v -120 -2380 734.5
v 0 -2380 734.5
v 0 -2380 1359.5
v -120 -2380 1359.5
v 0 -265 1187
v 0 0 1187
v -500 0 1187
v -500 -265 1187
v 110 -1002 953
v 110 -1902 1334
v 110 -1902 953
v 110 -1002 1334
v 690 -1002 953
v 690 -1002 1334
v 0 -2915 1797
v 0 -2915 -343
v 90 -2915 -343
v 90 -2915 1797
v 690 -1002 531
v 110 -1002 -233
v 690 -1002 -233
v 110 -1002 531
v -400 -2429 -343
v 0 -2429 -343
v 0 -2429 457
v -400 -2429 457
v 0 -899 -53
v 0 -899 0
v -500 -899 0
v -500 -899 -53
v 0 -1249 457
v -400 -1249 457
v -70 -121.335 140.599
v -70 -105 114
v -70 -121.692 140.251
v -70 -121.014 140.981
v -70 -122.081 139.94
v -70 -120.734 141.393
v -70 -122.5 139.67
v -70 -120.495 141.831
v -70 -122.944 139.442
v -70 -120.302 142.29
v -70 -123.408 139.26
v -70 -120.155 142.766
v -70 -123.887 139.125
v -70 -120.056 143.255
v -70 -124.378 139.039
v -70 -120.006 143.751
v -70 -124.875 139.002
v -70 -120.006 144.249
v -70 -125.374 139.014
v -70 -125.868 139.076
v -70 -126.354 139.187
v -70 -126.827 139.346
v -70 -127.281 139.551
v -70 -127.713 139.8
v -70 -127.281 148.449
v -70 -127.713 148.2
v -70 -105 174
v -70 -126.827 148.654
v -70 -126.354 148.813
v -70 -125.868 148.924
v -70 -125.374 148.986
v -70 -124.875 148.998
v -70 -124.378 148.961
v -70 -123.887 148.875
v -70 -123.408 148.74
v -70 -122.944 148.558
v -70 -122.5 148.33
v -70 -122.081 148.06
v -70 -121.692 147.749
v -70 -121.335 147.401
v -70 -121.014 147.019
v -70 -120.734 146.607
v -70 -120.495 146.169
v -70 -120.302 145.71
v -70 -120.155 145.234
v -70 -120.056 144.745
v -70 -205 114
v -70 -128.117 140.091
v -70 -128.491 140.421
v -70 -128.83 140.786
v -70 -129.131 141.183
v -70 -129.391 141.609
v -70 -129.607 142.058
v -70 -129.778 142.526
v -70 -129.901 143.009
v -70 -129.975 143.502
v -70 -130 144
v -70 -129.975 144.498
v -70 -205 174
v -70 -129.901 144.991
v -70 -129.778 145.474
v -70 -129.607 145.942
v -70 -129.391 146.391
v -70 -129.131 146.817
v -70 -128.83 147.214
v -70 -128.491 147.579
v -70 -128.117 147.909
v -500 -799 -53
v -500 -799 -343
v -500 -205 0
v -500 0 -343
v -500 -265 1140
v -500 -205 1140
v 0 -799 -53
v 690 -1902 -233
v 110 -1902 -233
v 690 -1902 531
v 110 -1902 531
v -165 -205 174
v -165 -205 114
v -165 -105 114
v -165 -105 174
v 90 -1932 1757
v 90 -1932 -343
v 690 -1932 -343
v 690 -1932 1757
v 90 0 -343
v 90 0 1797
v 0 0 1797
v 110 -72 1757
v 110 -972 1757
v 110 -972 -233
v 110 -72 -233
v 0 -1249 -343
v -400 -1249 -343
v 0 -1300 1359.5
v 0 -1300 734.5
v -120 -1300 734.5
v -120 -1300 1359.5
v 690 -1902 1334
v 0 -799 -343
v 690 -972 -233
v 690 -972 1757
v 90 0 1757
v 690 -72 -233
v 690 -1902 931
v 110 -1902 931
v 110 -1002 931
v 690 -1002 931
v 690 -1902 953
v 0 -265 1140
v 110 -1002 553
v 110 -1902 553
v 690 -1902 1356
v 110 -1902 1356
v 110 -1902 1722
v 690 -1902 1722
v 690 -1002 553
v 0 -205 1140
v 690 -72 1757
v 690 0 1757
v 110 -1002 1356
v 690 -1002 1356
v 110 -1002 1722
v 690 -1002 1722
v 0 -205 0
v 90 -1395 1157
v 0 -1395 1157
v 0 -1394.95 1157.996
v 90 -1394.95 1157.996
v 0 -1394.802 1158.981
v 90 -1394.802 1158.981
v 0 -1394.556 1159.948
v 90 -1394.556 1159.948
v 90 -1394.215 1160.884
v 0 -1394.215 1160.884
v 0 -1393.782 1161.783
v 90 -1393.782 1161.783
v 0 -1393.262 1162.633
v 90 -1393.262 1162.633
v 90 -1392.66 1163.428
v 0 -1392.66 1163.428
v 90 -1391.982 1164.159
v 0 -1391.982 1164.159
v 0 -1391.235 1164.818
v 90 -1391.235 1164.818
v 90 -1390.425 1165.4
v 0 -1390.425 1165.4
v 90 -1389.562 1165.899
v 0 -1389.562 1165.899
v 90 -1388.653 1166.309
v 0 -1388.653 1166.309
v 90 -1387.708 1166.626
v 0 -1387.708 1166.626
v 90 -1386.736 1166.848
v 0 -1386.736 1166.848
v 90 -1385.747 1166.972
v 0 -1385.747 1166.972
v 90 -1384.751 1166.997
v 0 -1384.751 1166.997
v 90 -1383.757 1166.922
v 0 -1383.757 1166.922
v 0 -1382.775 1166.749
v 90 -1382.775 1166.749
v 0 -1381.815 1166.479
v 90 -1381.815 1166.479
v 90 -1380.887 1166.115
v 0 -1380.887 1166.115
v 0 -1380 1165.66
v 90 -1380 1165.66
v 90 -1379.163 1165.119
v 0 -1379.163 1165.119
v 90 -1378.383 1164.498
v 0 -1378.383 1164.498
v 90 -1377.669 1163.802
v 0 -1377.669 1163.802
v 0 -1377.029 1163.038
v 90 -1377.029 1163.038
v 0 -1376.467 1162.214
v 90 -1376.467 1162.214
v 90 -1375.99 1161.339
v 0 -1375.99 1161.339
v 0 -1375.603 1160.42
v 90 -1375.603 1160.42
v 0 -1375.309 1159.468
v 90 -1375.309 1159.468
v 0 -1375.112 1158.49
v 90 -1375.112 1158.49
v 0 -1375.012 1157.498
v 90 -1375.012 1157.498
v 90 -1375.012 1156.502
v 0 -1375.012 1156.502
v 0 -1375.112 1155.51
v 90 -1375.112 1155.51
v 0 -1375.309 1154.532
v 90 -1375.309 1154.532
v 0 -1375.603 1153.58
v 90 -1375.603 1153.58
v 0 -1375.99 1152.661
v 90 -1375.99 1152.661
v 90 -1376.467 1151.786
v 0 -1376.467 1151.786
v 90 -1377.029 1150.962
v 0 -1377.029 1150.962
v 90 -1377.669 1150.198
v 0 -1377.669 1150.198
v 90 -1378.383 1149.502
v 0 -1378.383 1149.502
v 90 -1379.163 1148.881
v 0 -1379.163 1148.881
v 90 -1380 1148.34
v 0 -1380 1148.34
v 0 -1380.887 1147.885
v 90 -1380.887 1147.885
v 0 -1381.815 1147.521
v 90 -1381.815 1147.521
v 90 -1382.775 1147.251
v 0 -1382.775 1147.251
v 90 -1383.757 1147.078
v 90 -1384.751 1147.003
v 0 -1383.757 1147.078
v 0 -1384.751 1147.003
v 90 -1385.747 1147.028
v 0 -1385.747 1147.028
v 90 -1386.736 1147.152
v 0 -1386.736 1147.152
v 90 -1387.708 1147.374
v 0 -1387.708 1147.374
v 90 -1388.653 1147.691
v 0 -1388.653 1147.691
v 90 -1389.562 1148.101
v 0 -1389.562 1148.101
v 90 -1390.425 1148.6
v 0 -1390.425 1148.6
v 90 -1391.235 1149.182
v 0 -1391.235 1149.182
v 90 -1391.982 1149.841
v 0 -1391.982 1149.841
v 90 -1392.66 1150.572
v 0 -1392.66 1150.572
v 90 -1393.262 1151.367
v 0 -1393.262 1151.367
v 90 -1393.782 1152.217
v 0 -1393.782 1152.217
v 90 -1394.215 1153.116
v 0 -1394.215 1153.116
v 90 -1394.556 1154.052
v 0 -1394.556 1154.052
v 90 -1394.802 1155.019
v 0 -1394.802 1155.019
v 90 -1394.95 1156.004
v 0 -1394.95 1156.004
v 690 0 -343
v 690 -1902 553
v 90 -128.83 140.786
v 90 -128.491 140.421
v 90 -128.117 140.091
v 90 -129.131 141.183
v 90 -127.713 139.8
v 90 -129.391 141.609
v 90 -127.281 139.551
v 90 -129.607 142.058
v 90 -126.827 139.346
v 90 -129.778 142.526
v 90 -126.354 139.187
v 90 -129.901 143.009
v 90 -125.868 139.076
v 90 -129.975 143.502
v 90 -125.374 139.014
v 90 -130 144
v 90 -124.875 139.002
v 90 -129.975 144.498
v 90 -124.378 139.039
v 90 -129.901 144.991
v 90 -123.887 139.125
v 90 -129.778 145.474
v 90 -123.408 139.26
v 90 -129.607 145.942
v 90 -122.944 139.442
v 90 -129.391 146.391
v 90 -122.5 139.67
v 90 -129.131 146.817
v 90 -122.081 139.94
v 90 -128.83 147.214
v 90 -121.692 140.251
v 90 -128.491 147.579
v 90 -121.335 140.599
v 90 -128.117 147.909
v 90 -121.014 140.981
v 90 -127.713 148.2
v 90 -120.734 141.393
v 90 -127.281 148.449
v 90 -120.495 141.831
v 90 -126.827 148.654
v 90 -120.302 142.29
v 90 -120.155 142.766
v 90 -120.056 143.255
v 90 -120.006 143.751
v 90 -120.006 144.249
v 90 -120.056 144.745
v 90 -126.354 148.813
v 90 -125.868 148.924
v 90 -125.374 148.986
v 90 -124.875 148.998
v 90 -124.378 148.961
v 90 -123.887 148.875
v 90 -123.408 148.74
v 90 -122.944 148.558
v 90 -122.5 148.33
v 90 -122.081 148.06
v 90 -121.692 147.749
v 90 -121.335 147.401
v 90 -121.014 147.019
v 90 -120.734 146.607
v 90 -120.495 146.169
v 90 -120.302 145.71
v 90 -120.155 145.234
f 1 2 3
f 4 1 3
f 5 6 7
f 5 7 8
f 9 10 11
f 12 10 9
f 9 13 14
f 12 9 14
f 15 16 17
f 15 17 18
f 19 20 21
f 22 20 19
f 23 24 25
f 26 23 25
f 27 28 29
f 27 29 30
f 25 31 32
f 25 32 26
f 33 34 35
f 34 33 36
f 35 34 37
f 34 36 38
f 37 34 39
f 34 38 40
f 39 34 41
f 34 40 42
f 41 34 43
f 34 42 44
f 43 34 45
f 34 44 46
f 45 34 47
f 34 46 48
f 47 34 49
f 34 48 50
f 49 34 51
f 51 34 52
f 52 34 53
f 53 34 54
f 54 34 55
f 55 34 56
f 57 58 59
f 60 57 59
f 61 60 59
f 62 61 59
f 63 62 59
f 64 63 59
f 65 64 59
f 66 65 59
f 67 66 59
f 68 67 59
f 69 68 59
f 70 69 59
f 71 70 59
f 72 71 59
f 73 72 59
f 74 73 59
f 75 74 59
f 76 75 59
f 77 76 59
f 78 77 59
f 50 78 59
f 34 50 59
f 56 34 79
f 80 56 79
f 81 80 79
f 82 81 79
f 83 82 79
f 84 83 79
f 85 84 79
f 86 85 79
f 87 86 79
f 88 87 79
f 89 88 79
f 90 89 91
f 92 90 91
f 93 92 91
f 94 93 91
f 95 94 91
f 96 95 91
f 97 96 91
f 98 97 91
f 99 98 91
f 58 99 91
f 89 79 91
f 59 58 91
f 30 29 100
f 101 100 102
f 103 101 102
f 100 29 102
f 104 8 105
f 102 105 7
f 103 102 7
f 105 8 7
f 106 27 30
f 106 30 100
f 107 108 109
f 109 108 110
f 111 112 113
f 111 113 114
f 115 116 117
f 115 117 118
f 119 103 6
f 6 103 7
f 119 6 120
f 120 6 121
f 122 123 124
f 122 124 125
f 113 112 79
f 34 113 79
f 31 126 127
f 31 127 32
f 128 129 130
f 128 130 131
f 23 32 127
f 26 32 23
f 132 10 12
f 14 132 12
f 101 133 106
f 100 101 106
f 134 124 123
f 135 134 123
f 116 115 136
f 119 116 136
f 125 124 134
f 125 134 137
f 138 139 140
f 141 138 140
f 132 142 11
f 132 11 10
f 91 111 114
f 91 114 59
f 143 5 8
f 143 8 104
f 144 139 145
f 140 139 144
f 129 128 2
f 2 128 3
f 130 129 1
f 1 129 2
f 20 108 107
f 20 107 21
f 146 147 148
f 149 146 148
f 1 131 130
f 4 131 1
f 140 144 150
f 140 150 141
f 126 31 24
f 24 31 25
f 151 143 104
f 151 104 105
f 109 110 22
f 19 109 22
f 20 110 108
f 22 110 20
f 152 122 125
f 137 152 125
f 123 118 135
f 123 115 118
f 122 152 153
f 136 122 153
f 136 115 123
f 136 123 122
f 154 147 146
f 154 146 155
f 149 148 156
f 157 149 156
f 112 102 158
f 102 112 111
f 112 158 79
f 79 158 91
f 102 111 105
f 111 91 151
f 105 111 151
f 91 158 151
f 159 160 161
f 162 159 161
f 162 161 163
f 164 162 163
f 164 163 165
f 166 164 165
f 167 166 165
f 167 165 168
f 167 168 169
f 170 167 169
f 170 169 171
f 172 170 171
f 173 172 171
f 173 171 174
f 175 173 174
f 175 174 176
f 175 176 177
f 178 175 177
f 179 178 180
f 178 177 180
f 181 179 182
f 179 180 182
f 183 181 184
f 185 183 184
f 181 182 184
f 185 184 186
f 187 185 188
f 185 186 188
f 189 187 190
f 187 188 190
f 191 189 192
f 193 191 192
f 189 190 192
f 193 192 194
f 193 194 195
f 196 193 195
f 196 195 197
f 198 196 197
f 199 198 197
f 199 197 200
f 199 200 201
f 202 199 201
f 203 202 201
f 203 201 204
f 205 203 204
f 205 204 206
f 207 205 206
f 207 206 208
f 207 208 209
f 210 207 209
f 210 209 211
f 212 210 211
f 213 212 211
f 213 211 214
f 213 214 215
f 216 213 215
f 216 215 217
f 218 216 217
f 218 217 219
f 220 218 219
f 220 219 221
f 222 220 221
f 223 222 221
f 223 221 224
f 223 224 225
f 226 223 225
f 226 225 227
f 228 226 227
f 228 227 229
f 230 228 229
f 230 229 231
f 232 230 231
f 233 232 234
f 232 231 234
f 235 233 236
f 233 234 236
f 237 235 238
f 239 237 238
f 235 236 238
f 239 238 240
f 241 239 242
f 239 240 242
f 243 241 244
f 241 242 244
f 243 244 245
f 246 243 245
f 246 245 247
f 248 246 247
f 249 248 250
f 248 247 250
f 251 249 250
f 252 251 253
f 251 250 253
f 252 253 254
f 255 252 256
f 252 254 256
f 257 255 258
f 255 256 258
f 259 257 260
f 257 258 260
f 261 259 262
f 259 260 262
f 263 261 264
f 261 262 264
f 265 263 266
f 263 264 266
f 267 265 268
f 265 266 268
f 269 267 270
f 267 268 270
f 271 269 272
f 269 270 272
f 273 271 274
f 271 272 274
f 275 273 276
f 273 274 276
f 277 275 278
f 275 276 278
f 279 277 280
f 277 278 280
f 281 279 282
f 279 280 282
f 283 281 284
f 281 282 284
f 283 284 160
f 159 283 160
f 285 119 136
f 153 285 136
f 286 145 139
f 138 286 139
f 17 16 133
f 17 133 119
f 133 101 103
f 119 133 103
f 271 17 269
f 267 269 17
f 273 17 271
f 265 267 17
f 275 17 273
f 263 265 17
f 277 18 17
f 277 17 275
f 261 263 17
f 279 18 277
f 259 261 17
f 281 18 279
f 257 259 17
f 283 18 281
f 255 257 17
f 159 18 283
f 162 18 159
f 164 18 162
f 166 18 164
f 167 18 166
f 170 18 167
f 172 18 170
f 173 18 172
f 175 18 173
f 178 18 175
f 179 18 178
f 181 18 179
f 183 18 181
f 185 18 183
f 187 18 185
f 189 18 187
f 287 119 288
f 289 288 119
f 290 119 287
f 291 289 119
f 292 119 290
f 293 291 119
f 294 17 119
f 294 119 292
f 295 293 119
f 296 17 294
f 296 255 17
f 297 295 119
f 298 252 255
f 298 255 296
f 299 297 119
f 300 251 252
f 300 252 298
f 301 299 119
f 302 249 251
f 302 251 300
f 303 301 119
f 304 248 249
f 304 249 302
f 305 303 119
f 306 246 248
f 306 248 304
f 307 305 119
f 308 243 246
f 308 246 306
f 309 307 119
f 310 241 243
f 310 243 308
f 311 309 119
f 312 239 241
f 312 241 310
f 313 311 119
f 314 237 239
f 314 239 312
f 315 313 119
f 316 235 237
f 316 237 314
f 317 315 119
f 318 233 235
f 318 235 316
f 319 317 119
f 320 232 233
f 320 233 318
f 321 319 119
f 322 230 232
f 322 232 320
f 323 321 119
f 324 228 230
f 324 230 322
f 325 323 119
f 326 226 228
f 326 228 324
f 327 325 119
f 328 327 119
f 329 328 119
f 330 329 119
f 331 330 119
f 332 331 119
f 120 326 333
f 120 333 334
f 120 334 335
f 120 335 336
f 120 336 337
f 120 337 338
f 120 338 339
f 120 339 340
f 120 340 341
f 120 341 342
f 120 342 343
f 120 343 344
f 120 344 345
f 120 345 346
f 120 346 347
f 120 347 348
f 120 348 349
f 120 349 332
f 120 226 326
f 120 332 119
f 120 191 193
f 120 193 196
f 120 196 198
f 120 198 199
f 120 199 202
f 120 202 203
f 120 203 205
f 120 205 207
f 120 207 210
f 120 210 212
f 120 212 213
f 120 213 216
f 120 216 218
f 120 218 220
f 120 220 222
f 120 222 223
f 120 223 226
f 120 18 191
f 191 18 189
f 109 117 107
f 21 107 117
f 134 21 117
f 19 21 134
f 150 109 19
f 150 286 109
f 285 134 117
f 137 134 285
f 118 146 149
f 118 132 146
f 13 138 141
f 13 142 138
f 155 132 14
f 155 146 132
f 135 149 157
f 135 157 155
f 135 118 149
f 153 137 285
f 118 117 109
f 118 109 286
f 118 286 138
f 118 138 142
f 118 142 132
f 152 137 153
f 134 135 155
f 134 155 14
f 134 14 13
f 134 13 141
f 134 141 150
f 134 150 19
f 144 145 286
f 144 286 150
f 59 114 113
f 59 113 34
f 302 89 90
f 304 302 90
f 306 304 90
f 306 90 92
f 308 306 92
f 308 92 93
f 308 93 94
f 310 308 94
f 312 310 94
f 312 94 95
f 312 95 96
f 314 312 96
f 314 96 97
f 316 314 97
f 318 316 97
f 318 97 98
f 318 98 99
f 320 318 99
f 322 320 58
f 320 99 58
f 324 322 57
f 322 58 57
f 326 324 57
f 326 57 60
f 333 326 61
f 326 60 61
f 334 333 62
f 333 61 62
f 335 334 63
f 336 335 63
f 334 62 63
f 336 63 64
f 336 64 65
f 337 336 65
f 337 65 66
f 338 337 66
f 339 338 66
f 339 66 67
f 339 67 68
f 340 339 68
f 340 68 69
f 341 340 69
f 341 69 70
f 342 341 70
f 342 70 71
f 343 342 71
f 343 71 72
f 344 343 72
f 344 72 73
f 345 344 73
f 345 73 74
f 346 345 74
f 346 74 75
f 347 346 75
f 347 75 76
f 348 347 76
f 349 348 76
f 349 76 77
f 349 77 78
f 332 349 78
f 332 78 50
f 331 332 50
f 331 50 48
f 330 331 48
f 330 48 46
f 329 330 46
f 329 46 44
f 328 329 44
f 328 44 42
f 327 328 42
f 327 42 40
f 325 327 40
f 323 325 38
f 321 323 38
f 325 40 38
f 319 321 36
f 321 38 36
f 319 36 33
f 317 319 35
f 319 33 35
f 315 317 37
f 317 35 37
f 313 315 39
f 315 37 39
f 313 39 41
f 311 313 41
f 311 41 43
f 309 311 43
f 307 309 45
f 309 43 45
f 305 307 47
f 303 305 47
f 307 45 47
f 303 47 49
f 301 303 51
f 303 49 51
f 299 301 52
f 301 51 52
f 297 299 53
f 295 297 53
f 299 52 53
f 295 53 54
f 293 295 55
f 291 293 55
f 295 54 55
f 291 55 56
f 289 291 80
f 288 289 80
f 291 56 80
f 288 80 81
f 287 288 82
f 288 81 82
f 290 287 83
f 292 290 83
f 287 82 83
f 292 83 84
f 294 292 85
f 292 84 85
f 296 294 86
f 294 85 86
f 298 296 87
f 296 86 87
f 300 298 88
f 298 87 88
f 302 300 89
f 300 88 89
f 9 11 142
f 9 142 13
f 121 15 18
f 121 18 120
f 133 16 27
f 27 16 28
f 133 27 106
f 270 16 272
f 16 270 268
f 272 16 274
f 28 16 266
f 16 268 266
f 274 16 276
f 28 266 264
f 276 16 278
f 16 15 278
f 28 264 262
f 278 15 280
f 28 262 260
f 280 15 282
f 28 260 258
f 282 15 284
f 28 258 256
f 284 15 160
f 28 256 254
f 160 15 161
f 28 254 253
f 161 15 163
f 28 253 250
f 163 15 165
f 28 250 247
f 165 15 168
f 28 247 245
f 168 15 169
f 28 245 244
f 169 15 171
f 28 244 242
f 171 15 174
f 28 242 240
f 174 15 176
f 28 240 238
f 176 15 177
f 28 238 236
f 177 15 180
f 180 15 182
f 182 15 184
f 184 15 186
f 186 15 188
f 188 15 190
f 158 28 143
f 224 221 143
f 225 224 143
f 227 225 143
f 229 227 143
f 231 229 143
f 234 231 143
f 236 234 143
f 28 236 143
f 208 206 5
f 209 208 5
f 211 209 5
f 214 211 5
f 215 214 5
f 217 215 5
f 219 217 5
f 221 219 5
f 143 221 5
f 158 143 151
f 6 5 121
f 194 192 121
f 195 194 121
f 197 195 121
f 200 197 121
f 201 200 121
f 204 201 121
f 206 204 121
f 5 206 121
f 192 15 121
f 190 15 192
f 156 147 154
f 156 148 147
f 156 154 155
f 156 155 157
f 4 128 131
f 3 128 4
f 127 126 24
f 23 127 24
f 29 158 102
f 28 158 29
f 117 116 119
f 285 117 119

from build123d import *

# Parameters (mm, degrees)
F0_W      = 205
F0_H      = 1140
F0_W_2    = 799
F0_H_2    = 290
F1_DEPTH  = 500
F2_W      = 95
F2_H      = 60
F3_DEPTH  = 100
F4_W      = 2915
F4_H      = 2140
F5_DEPTH  = 90
F6_W      = 1860
F6_H      = 110
F7_DEPTH  = 600
F6_H_2    = 1990
F8_DEPTH  = 20
F9_R      = 5
F10_DEPTH = 760.001
F11_W     = 30
F11_H     = 1990
F12_DEPTH = 580
F13_W     = 1080
F13_H     = 625
F14_DEPTH = 120
F13_W_2   = 1180
F13_H_2   = 800
F15_DEPTH = 400
F16_R     = 10
F17_DEPTH = 110
F18_W     = 900
F18_H     = 35
F18_H_2   = 22
F19_DEPTH = 580


# Not quite as in the source:
# - a feature names something its author has since deleted; it is built from what else it names


with BuildPart() as f1:
    # F0 (on Right) → F1 (new body)
    with BuildSketch(Plane.YZ):
        Polygon((0, -53), (0, 0), (-205, 0), (-899, 0), (-899, -53), (-799, -53), align=None)
        with Locations((-102.5, 570)):
            Rectangle(F0_W, F0_H)
        Polygon((-205, 1140), (0, 1140), (0, 1187), (-265, 1187), (-265, 1140), align=None)
        with Locations((-399.5, -198)):
            Rectangle(F0_W_2, F0_H_2)
    extrude(amount=-F1_DEPTH)

    # F2 (on face) → F3 (cut)
    with BuildSketch(Plane.XZ.offset(205)):
        with Locations((-117.5, 144)):
            Rectangle(F2_W, F2_H)
    extrude(amount=-F3_DEPTH, mode=Mode.SUBTRACT)

    # F4 (on Right) → F5 (join)
    with BuildSketch(Plane.YZ):
        with Locations((-1457.5, 727)):
            Rectangle(F4_W, F4_H)
    extrude(amount=F5_DEPTH)

    # F9 (on face) → F10 (cut, through all)
    with BuildSketch(Plane(origin=(-70, 0, 0), x_dir=(0, -1, 0), z_dir=(-1, 0, 0))):
        with Locations((125, 144)):
            Circle(F9_R)
    extrude(amount=-F10_DEPTH, mode=Mode.SUBTRACT)

    # F16 (on face) → F17 (cut, through all)
    with BuildSketch(Plane(origin=(0, 0, 0), x_dir=(0, -1, 0), z_dir=(-1, 0, 0))):
        with Locations((1385, 1157)):
            Circle(F16_R)
    extrude(amount=-F17_DEPTH, mode=Mode.SUBTRACT)


with BuildPart() as f7:
    # F6 (on face) → F7 (new body)
    with BuildSketch(Plane.YZ.offset(90)):
        Polygon((-72, -343), (0, -343), (0, 1757), (-72, 1757), (-72, -233), align=None)
        with Locations((-1002, -288)):
            Rectangle(F6_W, F6_H)
    extrude(amount=F7_DEPTH)

    # F6 (on face) → F8 (join)
    with BuildSketch(Plane.YZ.offset(90)):
        Polygon((-72, -343), (0, -343), (0, 1757), (-72, 1757), (-72, -233), align=None)
        with Locations((-1002, -288)):
            Rectangle(F6_W, F6_H)
        with Locations((-1002, 762)):
            Rectangle(F6_W, F6_H_2)
    extrude(amount=F8_DEPTH)

    # F11 (on face) → F12 (join, through all)
    with BuildSketch(Plane.YZ.offset(110)):
        with Locations((-987, 762)):
            Rectangle(F11_W, F11_H)
        with Locations((-1917, 762)):
            Rectangle(F11_W, F11_H)
    extrude(amount=F12_DEPTH)

    # F18 (on face) → F19 (join, through all)
    with BuildSketch(Plane.YZ.offset(110)):
        with Locations((-1452, 1739.5)):
            Rectangle(F18_W, F18_H)
        with Locations((-1452, 1345)):
            Rectangle(F18_W, F18_H_2)
        with Locations((-1452, 942)):
            Rectangle(F18_W, F18_H_2)
        with Locations((-1452, 542)):
            Rectangle(F18_W, F18_H_2)
    extrude(amount=F19_DEPTH)


with BuildPart() as f14:
    # F13 (on face) → F14 (new body)
    with BuildSketch(Plane(origin=(0, 0, 0), x_dir=(0, -1, 0), z_dir=(-1, 0, 0))):
        with Locations((1840, 1047)):
            Rectangle(F13_W, F13_H)
    extrude(amount=F14_DEPTH)


with BuildPart() as f15:
    # F13 (on face) → F15 (new body)
    with BuildSketch(Plane(origin=(0, 0, 0), x_dir=(0, -1, 0), z_dir=(-1, 0, 0))):
        with Locations((1839, 57)):
            Rectangle(F13_W_2, F13_H_2)
    extrude(amount=F15_DEPTH)


solid = Compound([f1.part, f7.part, f14.part, f15.part])
